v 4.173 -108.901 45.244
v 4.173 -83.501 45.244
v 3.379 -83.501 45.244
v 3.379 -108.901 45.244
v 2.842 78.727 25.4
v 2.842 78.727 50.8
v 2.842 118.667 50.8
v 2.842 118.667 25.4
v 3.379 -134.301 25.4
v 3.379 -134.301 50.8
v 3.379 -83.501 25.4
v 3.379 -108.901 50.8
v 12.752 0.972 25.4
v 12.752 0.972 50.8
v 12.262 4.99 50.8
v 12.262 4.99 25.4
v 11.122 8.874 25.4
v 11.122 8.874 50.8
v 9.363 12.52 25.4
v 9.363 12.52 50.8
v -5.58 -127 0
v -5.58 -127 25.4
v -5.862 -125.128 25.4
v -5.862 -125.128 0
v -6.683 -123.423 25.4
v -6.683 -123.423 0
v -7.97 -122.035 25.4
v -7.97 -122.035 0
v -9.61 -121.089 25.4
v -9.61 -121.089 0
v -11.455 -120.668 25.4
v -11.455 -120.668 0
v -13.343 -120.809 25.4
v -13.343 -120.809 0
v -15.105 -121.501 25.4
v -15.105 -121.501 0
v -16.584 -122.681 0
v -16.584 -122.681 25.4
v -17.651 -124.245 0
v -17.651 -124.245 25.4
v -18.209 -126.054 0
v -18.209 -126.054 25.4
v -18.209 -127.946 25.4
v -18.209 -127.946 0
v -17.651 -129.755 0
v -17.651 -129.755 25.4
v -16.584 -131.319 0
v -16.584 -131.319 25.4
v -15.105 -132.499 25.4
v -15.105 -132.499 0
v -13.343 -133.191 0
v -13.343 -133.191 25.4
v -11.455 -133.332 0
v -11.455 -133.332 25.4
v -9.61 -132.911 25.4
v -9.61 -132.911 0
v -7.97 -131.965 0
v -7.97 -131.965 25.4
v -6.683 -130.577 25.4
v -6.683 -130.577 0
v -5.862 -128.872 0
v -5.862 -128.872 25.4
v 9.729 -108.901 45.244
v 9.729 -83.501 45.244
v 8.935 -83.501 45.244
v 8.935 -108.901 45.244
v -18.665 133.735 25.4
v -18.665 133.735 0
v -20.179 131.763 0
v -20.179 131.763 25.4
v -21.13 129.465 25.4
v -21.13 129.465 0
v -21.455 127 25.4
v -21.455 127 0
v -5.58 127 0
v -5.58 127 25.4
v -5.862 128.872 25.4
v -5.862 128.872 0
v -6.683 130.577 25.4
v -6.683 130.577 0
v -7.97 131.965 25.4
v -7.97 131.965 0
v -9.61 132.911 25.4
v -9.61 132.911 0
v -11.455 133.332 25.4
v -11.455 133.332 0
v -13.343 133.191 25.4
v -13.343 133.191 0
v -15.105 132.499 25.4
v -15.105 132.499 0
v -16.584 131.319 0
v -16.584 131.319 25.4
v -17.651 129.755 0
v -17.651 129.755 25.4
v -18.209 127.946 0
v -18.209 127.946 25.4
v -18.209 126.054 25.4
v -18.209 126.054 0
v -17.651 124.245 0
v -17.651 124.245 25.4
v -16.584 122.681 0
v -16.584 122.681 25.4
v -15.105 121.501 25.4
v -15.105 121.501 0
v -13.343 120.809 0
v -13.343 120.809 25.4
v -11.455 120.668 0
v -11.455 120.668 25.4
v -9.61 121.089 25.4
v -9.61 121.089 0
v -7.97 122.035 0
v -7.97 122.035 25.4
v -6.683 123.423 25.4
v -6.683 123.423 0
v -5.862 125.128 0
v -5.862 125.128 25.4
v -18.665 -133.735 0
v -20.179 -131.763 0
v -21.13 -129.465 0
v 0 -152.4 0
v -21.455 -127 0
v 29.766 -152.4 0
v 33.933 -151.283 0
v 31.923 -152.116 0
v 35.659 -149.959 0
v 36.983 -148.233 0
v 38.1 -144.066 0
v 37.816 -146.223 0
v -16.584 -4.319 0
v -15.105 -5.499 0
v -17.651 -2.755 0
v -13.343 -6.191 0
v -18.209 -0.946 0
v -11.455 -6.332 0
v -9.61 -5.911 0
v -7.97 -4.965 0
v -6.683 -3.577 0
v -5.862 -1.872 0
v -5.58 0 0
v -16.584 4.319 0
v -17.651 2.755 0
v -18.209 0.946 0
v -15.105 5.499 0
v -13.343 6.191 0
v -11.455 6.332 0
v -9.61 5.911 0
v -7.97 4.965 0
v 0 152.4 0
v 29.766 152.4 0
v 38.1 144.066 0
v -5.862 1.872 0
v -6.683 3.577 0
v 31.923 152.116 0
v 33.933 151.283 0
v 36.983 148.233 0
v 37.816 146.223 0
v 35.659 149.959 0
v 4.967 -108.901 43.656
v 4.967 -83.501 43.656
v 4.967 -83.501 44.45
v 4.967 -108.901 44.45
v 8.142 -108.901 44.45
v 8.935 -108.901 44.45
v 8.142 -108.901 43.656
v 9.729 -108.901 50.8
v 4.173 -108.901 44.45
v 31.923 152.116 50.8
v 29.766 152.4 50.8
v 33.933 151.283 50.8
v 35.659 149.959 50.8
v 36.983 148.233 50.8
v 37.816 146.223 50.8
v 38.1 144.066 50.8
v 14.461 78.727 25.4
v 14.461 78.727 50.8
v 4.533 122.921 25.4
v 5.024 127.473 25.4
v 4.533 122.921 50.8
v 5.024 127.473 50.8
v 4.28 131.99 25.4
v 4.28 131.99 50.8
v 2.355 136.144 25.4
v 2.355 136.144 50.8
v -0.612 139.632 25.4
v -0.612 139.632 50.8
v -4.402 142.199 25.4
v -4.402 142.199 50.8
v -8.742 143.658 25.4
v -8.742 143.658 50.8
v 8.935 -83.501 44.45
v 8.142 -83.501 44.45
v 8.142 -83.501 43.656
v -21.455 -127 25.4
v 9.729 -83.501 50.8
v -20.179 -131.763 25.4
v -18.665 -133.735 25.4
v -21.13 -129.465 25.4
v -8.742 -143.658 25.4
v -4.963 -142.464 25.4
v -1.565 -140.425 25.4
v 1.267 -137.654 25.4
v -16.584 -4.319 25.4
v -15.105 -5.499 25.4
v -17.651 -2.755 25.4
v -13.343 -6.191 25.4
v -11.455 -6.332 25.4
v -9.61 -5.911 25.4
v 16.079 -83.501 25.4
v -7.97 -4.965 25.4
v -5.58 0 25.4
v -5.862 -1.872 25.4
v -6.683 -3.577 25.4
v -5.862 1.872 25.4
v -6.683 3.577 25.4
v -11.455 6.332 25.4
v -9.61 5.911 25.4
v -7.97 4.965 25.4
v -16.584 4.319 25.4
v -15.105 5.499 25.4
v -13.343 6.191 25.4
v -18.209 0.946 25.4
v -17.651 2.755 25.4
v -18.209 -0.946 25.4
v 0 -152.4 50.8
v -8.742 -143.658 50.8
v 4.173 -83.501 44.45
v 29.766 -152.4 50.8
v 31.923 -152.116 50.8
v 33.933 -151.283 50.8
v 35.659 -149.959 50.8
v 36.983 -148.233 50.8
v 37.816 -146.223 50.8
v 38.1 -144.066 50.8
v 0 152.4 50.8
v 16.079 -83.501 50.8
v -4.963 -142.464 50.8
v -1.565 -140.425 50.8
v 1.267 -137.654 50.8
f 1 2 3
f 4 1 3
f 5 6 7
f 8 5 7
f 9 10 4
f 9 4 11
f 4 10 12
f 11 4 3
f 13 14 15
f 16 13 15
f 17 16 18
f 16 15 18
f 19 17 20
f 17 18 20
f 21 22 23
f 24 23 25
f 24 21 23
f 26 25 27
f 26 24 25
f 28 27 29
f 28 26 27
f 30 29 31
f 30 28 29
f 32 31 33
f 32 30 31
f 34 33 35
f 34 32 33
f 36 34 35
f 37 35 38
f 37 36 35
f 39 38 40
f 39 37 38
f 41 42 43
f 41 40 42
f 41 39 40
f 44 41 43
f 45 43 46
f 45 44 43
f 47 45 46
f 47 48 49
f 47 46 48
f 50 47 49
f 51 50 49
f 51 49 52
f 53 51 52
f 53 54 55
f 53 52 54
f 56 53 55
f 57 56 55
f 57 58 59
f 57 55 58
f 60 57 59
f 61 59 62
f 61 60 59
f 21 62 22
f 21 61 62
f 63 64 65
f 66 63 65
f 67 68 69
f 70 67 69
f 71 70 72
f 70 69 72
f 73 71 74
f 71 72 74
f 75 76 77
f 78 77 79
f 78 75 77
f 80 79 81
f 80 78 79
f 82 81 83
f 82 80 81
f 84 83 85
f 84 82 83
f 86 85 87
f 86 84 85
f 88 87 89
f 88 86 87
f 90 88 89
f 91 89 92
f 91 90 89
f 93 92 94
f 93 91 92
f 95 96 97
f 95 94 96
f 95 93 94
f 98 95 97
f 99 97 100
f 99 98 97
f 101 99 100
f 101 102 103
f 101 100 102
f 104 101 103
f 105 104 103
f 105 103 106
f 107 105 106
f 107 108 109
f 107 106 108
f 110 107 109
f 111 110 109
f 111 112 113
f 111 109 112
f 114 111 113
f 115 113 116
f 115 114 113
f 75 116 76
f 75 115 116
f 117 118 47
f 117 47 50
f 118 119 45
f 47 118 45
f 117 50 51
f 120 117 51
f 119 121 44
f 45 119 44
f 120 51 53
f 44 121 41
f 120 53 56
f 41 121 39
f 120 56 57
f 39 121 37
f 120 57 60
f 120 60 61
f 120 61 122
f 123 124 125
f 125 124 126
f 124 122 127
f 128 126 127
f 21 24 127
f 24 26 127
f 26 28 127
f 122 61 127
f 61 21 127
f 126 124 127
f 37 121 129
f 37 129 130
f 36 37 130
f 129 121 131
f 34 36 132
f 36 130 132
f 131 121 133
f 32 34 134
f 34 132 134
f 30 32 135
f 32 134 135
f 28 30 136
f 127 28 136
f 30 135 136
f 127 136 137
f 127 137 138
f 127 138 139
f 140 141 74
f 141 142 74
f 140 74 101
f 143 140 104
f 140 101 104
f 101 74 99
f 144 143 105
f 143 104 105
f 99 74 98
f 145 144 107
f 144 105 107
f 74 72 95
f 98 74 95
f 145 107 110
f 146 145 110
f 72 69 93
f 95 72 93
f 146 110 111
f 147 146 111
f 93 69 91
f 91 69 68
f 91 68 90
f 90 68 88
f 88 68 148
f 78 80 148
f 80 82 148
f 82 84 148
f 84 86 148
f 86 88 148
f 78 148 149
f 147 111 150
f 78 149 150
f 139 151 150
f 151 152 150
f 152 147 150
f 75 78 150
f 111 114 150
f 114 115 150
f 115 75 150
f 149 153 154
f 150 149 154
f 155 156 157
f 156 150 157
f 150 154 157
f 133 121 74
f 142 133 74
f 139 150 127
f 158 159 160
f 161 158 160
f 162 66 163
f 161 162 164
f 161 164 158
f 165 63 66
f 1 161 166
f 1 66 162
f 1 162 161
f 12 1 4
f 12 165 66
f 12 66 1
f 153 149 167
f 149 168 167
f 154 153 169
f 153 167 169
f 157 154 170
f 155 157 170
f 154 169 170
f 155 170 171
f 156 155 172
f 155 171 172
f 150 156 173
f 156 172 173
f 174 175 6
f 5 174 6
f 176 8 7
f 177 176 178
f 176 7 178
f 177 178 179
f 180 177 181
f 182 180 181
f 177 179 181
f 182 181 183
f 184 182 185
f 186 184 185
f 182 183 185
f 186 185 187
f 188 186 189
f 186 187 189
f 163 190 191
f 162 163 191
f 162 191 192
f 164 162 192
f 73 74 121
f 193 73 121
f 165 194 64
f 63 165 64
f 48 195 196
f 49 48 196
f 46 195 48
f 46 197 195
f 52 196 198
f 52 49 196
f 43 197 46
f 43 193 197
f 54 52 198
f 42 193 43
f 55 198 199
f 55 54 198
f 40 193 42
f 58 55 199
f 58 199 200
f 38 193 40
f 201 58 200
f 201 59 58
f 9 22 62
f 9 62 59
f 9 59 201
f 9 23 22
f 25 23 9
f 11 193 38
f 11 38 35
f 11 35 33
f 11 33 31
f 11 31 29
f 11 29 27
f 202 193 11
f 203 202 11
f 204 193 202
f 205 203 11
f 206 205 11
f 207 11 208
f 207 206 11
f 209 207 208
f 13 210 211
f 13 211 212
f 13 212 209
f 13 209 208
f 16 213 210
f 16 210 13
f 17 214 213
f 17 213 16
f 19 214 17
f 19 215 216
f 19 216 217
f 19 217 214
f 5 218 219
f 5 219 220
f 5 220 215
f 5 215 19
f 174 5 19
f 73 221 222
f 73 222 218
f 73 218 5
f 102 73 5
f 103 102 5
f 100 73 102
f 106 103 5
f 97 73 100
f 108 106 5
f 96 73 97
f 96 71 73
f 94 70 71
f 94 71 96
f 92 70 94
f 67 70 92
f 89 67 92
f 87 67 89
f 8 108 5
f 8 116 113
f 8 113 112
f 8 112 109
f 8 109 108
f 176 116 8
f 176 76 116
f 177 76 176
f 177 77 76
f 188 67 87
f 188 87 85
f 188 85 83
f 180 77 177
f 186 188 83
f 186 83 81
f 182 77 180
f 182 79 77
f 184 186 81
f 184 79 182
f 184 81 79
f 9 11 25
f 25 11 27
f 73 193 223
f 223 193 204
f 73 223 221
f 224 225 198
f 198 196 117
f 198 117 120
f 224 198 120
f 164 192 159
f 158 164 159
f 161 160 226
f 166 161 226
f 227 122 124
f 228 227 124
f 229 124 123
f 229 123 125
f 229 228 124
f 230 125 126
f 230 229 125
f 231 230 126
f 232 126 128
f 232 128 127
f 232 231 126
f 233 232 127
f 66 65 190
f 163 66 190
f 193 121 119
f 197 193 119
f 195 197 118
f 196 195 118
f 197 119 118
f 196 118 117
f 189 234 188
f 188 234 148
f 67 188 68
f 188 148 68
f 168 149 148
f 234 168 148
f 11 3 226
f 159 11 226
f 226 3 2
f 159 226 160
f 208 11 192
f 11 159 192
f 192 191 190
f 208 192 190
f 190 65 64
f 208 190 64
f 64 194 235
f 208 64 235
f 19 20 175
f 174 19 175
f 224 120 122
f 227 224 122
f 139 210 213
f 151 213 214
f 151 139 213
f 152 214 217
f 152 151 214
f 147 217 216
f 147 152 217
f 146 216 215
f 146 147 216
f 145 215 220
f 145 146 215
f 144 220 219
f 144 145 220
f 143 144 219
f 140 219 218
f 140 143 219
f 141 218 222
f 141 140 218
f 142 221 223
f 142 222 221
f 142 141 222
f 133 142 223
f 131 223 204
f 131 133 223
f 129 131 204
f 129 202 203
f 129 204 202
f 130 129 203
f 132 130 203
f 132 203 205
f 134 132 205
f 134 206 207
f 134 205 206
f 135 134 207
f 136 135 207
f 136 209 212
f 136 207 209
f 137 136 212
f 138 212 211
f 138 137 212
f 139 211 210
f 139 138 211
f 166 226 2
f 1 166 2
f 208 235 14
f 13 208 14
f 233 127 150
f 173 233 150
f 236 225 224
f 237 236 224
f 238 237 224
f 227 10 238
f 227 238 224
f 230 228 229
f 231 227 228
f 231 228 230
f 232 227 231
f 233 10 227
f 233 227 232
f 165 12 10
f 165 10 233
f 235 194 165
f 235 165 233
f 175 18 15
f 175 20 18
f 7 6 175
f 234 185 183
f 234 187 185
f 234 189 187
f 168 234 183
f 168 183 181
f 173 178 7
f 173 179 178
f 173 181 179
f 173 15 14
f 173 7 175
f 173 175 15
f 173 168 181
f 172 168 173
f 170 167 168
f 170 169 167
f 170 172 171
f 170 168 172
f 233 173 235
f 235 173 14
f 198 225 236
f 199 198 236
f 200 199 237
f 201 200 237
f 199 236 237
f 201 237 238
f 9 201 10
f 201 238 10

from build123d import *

# Parameters (mm, degrees)
F0_R     = 6.35
F1_DEPTH = 50.8
F2_R     = 8.334375
F4_DEPTH = 25.4
F6_DEPTH = 25.4


with BuildPart() as f1:
    # F0 (on Top) → F1 (new body)
    with BuildSketch(Plane.XY):
        with BuildLine():
            Line((-21.4546158184, 127), (-21.4546158184, -127))
            ThreePointArc((-21.4546158184, -127), (-20.7295683656, -130.6450596933), (-18.6648079092, -133.7351920908))
            Line((-18.6648079092, -133.7351920908), (0, -152.4))
            Line((0, -152.4), (38.1, -152.4))
            Line((38.1, -152.4), (38.1, 152.4))
            Line((38.1, 152.4), (0, 152.4))
            Line((0, 152.4), (-18.6648079092, 133.7351920908))
            ThreePointArc((-18.6648079092, 133.7351920908), (-20.7295683656, 130.6450596933), (-21.4546158184, 127))
        make_face()
        with Locations((-11.9296158184, -127)):
            Circle(F0_R, mode=Mode.SUBTRACT)
        with Locations((-11.9296158184, 0)):
            Circle(F0_R, mode=Mode.SUBTRACT)
        with Locations((-11.9296158184, 127)):
            Circle(F0_R, mode=Mode.SUBTRACT)
    extrude(amount=F1_DEPTH)

    # F2
    f2_edges = [f1.edges().sort_by_distance(p)[0] for p in [
        (38.1, 152.4, 25.4),
        (38.1, -152.4, 25.4),
    ]]
    fillet(f2_edges, radius=F2_R)

    # F3 (on face) → F4 (cut)
    with BuildSketch(Plane.XY.offset(50.8)):
        with BuildLine():
            Line((-18.6648079092, -133.7351920908), (-8.741865195, -143.658134805))
            ThreePointArc((-8.741865195, -143.658134805), (-1.565286118, -140.4251956813), (3.379023496, -134.3007377408))
            Line((3.379023496, -134.3007377408), (3.379023496, -83.5007377408))
            Line((3.379023496, -83.5007377408), (16.079023496, -83.5007377408))
            Line((16.079023496, -83.5007377408), (12.7517639776, 0.9721621486))
            ThreePointArc((12.7517639776, 0.9721621486), (11.7712856877, 6.9557800194), (9.3626122843, 12.5202488115))
            Line((9.3626122843, 12.5202488115), (14.4614139572, 78.7273198366))
            Line((14.4614139572, 78.7273198366), (2.8423227302, 78.7273198366))
            Line((2.8423227302, 78.7273198366), (2.8423227302, 118.6666308892))
            ThreePointArc((2.8423227302, 118.6666308892), (3.4580879019, 134.1325860273), (-8.741865195, 143.658134805))
            Line((-8.741865195, 143.658134805), (-18.6648079092, 133.7351920908))
            ThreePointArc((-18.6648079092, 133.7351920908), (-20.7295683656, 130.6450596933), (-21.4546158184, 127))
            Line((-21.4546158184, 127), (-21.4546158184, -127))
            ThreePointArc((-21.4546158184, -127), (-20.7295683656, -130.6450596933), (-18.6648079092, -133.7351920908))
        make_face()
    extrude(amount=-F4_DEPTH, mode=Mode.SUBTRACT)

    # F5 (on face) → F6 (cut)
    with BuildSketch(Plane(origin=(0, -83.5007377408, 0), x_dir=(-1, 0, 0), z_dir=(0, 1, 0))):
        Polygon((-3.379023496, 50.8), (-9.729023496, 50.8), (-9.729023496, 45.24375), (-8.935273496, 45.24375), (-8.935273496, 44.45), (-8.141523496, 44.45), (-8.141523496, 43.65625), (-4.966523496, 43.65625), (-4.966523496, 44.45), (-4.172773496, 44.45), (-4.172773496, 45.24375), (-3.379023496, 45.24375), align=None)
    extrude(amount=-F6_DEPTH, mode=Mode.SUBTRACT)


solid = f1.part
